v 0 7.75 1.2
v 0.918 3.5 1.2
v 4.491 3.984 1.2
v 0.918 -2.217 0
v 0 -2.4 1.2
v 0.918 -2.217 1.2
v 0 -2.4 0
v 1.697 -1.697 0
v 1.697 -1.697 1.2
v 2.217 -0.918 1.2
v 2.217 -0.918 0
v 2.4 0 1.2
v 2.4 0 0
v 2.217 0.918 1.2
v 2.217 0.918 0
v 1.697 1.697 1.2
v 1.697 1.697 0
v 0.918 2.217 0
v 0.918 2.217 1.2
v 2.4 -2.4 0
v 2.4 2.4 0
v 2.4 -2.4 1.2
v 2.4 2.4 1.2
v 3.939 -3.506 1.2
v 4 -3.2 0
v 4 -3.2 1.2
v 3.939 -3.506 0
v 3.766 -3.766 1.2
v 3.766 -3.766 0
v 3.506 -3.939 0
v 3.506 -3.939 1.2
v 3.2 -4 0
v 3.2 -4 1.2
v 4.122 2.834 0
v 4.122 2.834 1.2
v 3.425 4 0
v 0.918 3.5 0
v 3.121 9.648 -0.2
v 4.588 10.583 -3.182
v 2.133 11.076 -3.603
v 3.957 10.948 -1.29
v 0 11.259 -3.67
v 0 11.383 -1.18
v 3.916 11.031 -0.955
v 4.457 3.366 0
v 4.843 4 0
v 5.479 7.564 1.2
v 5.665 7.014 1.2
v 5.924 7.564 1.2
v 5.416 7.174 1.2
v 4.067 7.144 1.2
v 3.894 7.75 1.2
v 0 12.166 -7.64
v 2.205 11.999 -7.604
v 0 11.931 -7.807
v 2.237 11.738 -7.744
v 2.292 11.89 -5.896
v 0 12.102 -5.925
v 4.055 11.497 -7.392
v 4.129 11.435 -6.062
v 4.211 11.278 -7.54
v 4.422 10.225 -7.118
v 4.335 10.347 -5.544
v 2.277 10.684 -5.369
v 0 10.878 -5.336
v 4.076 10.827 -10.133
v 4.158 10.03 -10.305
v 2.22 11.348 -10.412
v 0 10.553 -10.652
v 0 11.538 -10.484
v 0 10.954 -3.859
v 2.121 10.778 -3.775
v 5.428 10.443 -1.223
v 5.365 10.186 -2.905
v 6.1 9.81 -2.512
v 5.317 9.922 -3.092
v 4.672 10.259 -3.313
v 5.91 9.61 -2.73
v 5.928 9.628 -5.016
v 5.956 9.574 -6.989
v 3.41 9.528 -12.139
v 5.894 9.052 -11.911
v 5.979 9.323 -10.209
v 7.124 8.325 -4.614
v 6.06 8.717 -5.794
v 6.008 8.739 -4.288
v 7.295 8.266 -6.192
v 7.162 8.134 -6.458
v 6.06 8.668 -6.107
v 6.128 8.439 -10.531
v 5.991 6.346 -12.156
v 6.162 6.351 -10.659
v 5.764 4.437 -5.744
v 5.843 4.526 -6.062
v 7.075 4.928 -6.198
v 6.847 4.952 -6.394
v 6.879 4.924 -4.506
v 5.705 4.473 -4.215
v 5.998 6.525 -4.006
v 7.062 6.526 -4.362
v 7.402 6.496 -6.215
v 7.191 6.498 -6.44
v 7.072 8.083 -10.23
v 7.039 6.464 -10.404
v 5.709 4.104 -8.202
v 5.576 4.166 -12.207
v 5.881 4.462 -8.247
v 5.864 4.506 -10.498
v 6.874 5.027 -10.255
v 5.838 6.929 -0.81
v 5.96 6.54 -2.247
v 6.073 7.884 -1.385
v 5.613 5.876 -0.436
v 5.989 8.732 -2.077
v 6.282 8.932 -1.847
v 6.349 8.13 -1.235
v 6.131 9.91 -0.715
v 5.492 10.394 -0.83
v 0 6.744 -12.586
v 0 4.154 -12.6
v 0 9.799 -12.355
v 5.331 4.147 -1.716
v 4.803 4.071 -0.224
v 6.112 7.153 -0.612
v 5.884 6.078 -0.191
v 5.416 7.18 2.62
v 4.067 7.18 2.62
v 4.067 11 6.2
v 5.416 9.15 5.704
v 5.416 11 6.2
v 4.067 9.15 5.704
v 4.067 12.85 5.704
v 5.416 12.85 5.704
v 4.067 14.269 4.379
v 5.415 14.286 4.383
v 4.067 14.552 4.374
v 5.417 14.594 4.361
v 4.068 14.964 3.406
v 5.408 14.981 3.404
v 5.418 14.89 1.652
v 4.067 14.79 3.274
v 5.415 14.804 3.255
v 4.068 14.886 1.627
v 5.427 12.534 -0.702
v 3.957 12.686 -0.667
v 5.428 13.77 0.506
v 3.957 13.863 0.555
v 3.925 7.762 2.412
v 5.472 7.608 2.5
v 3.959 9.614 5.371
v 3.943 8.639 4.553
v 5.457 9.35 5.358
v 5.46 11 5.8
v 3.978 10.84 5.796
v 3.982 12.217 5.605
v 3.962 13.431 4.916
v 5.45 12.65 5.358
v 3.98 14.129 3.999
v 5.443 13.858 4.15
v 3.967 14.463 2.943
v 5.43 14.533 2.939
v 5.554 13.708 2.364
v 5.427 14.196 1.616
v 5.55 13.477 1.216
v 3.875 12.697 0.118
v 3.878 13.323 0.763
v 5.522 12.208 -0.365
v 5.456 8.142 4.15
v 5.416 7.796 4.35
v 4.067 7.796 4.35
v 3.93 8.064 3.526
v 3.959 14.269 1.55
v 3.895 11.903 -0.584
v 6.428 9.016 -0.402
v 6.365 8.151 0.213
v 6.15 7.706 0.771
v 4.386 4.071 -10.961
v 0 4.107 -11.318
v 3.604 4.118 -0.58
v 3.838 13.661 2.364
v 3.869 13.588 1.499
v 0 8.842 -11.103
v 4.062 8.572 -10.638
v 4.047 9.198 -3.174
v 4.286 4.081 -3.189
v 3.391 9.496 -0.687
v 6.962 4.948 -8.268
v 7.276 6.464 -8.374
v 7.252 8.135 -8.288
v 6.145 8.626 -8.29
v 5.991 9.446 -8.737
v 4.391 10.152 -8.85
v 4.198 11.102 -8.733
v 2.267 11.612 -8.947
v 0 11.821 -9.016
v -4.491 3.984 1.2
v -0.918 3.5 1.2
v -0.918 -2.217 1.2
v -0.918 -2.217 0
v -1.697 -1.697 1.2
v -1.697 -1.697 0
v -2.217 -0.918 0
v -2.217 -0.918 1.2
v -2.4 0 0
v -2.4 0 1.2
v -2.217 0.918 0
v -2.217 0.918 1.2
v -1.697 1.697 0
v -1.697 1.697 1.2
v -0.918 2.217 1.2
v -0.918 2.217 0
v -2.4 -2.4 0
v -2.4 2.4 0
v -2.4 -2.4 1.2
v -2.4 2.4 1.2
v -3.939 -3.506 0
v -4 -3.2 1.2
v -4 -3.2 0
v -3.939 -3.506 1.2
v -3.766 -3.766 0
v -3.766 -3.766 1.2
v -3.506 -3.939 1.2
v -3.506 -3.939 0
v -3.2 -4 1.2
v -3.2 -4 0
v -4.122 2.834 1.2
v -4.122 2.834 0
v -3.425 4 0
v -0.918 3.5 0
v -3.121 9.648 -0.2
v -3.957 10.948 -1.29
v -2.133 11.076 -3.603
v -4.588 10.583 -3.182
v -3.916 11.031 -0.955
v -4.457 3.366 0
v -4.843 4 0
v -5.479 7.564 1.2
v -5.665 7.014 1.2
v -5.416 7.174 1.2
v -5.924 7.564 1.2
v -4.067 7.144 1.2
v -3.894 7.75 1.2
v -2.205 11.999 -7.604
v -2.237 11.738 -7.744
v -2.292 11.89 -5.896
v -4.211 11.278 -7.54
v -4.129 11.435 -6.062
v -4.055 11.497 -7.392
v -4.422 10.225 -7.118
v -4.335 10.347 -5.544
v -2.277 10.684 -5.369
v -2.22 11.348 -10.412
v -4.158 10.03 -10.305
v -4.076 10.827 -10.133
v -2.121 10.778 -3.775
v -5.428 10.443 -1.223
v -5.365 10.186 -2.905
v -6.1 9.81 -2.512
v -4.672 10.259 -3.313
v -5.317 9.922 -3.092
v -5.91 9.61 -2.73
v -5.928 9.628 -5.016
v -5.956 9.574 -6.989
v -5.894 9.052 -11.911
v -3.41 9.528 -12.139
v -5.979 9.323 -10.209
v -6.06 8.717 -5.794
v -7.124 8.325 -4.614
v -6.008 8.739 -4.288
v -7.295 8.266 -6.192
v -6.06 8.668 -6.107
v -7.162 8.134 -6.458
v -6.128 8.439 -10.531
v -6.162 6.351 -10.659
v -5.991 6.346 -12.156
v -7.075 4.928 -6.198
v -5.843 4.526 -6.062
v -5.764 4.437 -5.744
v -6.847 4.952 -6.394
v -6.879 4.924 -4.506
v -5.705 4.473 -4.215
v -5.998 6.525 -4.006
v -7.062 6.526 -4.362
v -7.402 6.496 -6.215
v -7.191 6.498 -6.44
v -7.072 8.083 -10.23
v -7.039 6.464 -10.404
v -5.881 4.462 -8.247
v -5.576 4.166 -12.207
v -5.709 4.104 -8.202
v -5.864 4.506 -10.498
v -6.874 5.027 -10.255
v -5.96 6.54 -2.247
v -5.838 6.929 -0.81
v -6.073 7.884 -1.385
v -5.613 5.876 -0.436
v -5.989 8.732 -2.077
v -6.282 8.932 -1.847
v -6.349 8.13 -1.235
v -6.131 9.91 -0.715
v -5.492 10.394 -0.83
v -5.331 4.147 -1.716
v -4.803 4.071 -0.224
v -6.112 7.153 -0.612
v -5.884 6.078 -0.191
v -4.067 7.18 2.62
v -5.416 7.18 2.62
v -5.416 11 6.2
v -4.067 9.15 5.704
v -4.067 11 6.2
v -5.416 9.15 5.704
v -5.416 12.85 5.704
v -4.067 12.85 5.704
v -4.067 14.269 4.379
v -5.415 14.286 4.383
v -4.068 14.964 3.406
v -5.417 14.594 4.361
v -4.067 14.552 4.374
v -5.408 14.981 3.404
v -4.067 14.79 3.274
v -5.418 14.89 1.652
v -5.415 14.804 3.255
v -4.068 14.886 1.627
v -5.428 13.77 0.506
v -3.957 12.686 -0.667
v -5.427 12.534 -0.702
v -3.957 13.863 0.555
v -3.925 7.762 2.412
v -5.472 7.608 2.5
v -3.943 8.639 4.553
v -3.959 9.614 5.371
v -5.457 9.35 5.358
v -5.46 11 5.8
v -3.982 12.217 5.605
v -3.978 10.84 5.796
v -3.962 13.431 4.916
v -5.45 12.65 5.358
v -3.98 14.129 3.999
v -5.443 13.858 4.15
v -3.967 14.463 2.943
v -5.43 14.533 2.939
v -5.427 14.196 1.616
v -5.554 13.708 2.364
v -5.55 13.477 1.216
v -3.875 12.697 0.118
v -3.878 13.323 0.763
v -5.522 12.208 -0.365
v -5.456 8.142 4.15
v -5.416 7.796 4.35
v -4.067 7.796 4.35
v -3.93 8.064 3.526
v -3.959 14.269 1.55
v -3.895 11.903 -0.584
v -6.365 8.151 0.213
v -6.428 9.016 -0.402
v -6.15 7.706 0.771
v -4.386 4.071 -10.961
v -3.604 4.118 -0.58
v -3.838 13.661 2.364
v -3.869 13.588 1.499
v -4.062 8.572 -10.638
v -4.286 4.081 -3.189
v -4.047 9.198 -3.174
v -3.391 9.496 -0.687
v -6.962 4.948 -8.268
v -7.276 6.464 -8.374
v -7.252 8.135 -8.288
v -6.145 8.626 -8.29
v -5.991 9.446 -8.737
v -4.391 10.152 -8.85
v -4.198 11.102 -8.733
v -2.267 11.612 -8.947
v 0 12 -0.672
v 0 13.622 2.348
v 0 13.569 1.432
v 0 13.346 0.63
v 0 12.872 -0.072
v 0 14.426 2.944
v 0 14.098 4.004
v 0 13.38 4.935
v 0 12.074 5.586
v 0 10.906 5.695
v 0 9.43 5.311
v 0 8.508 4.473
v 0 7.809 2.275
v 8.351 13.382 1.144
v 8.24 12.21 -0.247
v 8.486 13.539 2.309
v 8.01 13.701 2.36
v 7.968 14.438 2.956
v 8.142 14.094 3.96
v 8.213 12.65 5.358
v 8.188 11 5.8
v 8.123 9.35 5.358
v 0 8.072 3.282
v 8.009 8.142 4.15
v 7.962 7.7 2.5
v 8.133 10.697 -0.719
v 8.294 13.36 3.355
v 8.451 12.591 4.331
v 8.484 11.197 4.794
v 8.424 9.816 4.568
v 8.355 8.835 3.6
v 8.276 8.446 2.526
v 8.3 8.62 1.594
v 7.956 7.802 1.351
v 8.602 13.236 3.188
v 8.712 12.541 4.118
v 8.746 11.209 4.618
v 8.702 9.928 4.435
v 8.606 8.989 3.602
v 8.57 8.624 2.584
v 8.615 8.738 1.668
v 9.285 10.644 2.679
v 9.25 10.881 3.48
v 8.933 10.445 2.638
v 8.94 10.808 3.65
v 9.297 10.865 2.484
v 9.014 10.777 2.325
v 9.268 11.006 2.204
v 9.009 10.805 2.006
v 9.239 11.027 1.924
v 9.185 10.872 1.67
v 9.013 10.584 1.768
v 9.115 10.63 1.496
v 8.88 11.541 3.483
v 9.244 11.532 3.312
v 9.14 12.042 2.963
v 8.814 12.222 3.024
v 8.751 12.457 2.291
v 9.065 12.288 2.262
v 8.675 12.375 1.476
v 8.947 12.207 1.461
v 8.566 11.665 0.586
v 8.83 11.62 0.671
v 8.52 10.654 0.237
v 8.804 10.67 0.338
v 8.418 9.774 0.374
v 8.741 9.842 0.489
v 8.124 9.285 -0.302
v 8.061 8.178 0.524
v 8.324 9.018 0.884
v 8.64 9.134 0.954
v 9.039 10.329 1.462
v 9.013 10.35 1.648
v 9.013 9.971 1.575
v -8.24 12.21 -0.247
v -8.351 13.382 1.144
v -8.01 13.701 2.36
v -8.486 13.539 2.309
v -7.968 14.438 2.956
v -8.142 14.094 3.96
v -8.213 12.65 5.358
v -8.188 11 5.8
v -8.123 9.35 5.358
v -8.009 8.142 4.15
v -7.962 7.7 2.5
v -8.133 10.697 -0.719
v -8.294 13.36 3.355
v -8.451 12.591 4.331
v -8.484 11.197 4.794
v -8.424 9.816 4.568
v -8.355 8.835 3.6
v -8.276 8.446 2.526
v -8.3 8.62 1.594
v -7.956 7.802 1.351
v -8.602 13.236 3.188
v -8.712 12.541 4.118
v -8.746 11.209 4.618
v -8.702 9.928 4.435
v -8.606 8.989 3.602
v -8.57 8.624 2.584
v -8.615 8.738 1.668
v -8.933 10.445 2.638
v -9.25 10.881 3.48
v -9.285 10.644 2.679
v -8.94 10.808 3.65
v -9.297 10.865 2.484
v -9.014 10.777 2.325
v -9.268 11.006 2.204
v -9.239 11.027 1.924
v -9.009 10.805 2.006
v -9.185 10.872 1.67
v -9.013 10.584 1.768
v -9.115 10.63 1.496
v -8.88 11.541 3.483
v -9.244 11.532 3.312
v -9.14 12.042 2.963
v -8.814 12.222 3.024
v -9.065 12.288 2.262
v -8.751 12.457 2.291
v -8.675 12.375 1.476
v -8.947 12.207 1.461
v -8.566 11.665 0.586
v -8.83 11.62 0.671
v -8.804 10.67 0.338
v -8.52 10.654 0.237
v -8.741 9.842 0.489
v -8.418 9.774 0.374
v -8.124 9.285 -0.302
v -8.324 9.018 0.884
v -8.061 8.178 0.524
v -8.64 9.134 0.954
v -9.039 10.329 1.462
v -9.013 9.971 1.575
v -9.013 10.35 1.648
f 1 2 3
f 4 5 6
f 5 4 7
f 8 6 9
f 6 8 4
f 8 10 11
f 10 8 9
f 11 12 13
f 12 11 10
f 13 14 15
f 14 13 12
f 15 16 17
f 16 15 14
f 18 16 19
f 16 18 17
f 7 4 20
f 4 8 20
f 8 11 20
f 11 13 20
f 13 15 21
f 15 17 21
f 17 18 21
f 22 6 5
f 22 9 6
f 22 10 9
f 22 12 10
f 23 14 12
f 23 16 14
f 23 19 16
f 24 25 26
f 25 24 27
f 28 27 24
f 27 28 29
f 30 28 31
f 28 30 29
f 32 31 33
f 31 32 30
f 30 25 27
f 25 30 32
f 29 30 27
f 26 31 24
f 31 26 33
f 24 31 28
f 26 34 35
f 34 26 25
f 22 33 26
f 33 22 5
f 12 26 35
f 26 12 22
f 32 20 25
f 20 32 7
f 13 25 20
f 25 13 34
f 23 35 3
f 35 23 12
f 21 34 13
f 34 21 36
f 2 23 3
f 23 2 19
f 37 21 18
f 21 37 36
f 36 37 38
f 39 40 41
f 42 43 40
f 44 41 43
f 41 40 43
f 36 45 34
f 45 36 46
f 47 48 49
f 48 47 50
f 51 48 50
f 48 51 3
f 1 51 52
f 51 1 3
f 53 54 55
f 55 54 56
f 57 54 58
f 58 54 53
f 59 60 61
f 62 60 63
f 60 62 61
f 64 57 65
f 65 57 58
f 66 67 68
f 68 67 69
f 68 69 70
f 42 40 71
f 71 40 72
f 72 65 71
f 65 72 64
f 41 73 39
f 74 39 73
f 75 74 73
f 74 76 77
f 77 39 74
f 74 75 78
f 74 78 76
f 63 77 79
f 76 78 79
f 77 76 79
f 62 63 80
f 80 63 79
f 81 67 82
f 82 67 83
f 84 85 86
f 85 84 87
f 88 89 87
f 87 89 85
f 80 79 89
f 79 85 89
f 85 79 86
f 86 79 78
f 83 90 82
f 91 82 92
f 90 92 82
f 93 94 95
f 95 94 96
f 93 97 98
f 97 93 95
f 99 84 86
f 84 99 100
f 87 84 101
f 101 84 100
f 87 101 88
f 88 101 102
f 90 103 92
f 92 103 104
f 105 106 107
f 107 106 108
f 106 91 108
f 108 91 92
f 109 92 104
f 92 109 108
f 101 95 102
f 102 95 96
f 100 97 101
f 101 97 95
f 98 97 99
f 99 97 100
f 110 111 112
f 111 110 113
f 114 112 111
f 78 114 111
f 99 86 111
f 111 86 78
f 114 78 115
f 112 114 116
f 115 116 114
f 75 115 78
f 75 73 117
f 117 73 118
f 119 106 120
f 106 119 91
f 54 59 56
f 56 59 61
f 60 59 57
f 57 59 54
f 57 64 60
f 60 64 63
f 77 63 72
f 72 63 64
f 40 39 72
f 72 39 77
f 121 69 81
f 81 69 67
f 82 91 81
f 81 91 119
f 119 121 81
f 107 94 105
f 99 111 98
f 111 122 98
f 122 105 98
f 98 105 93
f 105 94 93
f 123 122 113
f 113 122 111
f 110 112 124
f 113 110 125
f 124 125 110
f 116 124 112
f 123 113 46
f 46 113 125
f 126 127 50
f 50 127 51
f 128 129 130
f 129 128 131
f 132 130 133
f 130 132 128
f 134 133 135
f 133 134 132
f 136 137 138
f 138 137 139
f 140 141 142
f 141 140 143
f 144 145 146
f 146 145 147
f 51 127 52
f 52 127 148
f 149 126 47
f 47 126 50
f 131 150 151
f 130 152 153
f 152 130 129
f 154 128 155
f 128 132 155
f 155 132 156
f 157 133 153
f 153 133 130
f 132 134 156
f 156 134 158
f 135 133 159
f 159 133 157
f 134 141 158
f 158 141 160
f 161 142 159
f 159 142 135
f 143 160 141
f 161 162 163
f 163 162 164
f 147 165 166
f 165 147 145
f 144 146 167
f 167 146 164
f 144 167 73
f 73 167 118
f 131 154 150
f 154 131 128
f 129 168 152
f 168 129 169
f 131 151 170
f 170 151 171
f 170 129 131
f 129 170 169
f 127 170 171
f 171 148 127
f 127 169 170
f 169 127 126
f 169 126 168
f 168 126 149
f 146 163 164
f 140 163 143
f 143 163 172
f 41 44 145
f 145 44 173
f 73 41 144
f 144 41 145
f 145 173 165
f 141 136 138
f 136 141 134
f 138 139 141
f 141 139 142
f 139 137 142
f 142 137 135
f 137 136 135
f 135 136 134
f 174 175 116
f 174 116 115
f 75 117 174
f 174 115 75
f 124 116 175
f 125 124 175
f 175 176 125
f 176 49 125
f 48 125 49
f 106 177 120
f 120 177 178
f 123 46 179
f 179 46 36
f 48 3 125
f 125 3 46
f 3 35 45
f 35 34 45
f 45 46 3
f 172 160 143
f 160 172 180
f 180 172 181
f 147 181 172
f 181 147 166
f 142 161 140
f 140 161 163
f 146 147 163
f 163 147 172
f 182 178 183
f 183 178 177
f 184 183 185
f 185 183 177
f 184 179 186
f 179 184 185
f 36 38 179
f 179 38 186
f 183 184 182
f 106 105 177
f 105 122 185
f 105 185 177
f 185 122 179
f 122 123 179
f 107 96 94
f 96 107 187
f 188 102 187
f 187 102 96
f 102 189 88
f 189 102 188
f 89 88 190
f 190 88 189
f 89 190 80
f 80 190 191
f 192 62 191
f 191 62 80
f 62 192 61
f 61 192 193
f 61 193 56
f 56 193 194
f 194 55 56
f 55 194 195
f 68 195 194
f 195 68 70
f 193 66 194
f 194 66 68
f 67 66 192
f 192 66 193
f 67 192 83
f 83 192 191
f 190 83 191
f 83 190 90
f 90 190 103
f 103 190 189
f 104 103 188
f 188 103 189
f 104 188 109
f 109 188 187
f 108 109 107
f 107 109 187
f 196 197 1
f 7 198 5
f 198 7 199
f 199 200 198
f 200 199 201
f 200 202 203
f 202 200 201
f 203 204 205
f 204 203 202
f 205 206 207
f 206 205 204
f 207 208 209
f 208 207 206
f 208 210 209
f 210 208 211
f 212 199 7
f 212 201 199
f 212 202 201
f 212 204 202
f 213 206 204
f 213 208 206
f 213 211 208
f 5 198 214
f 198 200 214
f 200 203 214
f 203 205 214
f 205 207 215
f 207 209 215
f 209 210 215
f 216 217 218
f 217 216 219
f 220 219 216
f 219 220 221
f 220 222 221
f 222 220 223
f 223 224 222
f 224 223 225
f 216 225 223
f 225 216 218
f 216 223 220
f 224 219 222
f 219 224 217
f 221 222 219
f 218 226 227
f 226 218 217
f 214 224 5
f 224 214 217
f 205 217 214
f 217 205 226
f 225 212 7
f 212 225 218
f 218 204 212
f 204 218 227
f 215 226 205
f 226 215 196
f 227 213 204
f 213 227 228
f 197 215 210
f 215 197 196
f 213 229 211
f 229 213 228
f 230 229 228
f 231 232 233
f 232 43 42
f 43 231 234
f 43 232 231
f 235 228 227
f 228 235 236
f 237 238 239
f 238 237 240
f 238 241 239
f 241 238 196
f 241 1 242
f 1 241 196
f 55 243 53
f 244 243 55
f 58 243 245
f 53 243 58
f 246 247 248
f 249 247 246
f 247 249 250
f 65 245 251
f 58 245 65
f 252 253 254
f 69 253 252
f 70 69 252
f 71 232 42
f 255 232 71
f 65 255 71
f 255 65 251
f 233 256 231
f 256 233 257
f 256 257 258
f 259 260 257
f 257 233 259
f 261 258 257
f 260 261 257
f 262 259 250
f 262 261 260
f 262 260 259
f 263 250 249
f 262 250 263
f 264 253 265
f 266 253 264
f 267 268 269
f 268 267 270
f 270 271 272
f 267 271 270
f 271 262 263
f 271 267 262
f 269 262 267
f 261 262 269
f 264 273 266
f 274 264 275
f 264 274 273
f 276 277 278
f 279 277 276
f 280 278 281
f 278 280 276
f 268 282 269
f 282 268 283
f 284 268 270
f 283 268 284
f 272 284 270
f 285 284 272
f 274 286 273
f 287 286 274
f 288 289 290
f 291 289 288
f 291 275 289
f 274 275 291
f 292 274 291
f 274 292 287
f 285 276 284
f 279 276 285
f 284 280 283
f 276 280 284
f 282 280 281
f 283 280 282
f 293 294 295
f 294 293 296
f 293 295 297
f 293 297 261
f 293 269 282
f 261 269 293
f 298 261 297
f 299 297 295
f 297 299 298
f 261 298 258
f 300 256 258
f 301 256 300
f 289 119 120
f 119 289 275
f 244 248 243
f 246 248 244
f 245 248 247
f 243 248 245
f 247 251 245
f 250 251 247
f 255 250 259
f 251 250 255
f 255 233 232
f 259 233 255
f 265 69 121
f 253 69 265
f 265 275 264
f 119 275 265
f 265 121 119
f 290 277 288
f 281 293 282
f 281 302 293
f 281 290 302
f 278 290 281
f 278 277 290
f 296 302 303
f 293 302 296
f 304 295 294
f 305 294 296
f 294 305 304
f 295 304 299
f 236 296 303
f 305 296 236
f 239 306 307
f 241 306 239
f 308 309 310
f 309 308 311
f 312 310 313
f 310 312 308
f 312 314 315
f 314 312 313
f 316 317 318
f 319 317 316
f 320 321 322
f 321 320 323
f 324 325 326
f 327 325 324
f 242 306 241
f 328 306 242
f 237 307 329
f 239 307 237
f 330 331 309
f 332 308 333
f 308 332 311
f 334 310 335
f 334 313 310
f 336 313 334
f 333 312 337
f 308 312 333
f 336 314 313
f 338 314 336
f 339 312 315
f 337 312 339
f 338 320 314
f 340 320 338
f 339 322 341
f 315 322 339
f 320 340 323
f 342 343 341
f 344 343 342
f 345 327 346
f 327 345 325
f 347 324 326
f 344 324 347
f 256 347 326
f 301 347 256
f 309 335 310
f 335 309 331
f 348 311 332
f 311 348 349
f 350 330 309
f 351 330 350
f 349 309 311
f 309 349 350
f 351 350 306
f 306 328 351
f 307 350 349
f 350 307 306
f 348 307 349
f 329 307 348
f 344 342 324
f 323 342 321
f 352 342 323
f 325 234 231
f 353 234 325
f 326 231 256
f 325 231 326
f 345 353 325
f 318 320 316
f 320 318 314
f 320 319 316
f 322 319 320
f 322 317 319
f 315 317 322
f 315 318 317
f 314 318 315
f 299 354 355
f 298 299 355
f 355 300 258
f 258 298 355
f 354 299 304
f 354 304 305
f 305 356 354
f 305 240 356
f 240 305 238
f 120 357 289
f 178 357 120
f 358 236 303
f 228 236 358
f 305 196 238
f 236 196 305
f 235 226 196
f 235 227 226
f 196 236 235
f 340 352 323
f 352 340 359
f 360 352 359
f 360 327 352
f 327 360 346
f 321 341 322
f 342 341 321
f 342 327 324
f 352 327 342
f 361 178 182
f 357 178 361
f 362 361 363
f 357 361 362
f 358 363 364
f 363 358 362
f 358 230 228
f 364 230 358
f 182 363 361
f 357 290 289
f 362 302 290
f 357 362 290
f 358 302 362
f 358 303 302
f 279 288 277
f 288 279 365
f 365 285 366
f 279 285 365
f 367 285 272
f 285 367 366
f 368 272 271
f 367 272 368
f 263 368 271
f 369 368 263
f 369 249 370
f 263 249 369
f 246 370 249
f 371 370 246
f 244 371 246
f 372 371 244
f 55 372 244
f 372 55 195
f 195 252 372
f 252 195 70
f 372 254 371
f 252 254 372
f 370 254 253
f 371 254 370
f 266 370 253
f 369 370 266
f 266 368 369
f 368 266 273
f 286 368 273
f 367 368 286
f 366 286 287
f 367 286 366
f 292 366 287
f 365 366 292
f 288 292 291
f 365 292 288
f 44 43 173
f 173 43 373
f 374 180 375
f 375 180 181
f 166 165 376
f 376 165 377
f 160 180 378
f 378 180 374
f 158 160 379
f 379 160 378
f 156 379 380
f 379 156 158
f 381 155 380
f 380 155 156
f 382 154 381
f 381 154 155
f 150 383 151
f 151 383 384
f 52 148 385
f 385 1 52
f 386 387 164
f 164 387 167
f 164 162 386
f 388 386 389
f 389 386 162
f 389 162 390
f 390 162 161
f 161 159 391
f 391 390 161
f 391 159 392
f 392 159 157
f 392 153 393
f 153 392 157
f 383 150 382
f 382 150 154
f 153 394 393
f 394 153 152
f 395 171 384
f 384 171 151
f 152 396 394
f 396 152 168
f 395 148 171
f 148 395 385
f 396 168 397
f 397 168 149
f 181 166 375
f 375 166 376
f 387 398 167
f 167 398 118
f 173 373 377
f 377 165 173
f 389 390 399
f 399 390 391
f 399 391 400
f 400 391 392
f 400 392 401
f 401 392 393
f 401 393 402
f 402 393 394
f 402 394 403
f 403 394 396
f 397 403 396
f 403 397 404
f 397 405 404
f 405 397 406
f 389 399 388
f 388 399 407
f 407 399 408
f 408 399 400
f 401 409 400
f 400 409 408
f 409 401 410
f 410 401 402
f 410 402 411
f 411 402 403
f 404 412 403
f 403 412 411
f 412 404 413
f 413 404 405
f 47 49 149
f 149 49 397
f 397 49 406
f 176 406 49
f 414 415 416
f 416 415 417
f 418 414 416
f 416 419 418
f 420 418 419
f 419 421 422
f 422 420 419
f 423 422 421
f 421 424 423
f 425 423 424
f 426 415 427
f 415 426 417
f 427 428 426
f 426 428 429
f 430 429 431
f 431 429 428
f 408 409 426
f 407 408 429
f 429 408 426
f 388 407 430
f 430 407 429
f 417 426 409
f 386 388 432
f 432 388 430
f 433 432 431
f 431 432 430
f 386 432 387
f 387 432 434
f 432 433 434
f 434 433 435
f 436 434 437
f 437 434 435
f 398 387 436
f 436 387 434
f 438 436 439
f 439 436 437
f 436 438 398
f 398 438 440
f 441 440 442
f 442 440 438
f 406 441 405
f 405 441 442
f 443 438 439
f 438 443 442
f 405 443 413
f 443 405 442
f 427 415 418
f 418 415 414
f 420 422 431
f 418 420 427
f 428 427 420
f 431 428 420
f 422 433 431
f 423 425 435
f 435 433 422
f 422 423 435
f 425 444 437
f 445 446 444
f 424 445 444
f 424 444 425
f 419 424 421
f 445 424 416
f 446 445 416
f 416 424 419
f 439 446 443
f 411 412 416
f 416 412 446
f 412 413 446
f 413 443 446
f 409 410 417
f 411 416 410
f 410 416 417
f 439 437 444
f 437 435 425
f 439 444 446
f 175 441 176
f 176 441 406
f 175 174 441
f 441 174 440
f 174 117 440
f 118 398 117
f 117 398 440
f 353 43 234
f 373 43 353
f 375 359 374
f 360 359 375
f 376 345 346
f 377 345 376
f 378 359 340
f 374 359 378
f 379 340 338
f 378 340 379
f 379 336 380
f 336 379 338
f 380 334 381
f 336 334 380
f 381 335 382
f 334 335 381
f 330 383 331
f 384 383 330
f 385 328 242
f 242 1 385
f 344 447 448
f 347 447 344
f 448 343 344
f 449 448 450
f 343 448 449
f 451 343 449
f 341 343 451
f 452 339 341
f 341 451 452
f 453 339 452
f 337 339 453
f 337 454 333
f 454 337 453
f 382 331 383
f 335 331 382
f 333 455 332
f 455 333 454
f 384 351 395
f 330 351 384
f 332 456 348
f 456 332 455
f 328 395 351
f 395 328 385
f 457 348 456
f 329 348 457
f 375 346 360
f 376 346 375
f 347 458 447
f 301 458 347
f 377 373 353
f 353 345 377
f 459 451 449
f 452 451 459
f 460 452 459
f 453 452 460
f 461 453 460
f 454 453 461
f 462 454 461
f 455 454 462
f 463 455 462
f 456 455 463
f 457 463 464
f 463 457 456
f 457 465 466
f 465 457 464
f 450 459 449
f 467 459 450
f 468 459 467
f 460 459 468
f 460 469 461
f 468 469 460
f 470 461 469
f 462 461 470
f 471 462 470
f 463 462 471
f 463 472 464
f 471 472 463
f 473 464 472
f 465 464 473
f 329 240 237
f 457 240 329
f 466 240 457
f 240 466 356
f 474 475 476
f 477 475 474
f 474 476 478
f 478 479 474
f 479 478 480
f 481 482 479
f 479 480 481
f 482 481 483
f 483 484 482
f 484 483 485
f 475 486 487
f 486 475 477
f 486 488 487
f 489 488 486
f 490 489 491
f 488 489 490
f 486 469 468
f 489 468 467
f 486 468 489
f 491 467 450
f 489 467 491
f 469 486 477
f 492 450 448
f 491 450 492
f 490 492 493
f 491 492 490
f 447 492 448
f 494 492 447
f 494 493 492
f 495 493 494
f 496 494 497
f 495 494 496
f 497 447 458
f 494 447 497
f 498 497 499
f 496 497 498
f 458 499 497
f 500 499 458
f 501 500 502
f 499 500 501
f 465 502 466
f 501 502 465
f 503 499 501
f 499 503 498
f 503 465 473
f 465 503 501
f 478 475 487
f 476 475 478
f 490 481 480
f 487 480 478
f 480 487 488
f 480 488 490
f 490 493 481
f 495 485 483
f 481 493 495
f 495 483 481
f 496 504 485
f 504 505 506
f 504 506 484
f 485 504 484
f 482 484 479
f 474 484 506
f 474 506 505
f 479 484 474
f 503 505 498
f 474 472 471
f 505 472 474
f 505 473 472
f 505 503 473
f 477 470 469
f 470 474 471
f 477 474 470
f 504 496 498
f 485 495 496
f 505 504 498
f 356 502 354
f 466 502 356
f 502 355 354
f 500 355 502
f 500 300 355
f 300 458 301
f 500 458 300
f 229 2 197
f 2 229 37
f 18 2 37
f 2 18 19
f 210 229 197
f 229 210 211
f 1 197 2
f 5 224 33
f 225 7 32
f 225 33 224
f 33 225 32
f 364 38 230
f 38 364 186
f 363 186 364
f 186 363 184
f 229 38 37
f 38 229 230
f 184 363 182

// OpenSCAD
use <../lib.scad>
use <../p/box3u2p.scad>
use <../p/rect2p.scad>
use <s/26073s01.scad>
use <s/26073s02.scad>
$fa=1; $fs=0.2;
function ldraw_lib__26073(realsolid=false) = [
// 0 Minifig Backpack with Three Pouches and Bedroll
// 0 Name: 26073.dat
// 0 Author: Gerald Lasser [GeraldLasser]
// 0 !LDRAW_ORG Part UPDATE 2022-04
// 0 !LICENSE Licensed under CC BY 2.0 and CC BY 4.0 : see CAreadme.txt
// 
// 0 BFC CERTIFY CCW
  [0,"BFC","CERTIFY"],
  [0,"BFC","CCW"],
// 
// 0 !CATEGORY Minifig Neckwear
// 
// 0 !HISTORY 2022-07-18 [PTadmin] Official Update 2022-04
// 
// 
// 1 16 0 0 0 1 0 0 0 1 0 0 0 1 s\26073s01.dat
  [1,16,0,0,0,1,0,0,0,1,0,0,0,1, ldraw_lib__s__26073s01(realsolid)],
// 1 16 0 0 0 -1 0 0 0 1 0 0 0 1 s\26073s01.dat
  [1,16,0,0,0,-1,0,0,0,1,0,0,0,1, ldraw_lib__s__26073s01(realsolid)],
// 1 16 0 0 0 1 0 0 0 1 0 0 0 1 s\26073s02.dat
  [1,16,0,0,0,1,0,0,0,1,0,0,0,1, ldraw_lib__s__26073s02(realsolid)],
// 1 16 0 0 0 -1 0 0 0 1 0 0 0 1 s\26073s02.dat
  [1,16,0,0,0,-1,0,0,0,1,0,0,0,1, ldraw_lib__s__26073s02(realsolid)],
// 
// 0 BFC INVERTNEXT
  [0,"BFC","INVERTNEXT"],
// 1 16 0 -1.5 5.5434 0 0 2.2962 1.5 0 0 0 3.2066 0 box3u2p.dat
  [1,16,0,-1.5,5.5434,0,0,2.2962,1.5,0,0,0,3.2066,0, ldraw_lib__box3u2p(realsolid)],
// 3 16 0 -3 19.374 -2.2962 -3 8.75 2.2962 -3 8.75
  [3,16,0,-3,19.374,-2.2962,-3,8.75,2.2962,-3,8.75],
// 3 16 0 -3 -6 -8 -3 -10 8 -3 -10
  [3,16,0,-3,-6,-8,-3,-10,8,-3,-10],
// 3 16 -8 0 -10 0 0 -6 8 0 -10
  [3,16,-8,0,-10,0,0,-6,8,0,-10],
// 1 16 0 -1.5 -10 -8 0 0 0 0 1.5 0 1 0 rect2p.dat
  [1,16,0,-1.5,-10,-8,0,0,0,0,1.5,0,1,0, ldraw_lib__rect2p(realsolid)],
// 2 24 7.802 .499 24.119 -7.802 .499 24.119
  [2,24,7.802,.499,24.119,-7.802,.499,24.119],
// 
// 4 16 7.802 .499 24.119 -7.802 .499 24.119 -8.477 1.717 23.739 8.477 1.717 23.739
  [4,16,7.802,.499,24.119,-7.802,.499,24.119,-8.477,1.717,23.739,8.477,1.717,23.739],
// 4 16 10.117 7.934 22.995 8.477 1.717 23.739 -8.477 1.717 23.739 -10.117 7.934 22.995
  [4,16,10.117,7.934,22.995,8.477,1.717,23.739,-8.477,1.717,23.739,-10.117,7.934,22.995],
// 4 16 2.2962 0 8.75 -2.2962 0 8.75 -7.802 .499 24.119 7.802 .499 24.119
  [4,16,2.2962,0,8.75,-2.2962,0,8.75,-7.802,.499,24.119,7.802,.499,24.119],
// 3 16 10.117 7.934 22.995 -10.117 7.934 22.995 0 27.758 22.106
  [3,16,10.117,7.934,22.995,-10.117,7.934,22.995,0,27.758,22.106],
// 5 24 8.477 1.717 23.739 -8.477 1.717 23.739 7.802 .499 24.119 10.117 7.934 22.995
  [5,24,8.477,1.717,23.739,-8.477,1.717,23.739,7.802,.499,24.119,10.117,7.934,22.995],
// 5 24 -10.117 7.934 22.995 10.117 7.934 22.995 8.477 1.717 23.739 10.156 26.595 21.431
  [5,24,-10.117,7.934,22.995,10.117,7.934,22.995,8.477,1.717,23.739,10.156,26.595,21.431],
// 5 24 10.117 7.934 22.995 0 27.758 22.106 10.156 26.595 21.431 -10.117 7.934 22.995
  [5,24,10.117,7.934,22.995,0,27.758,22.106,10.156,26.595,21.431,-10.117,7.934,22.995],
// 5 24 0 27.758 22.106 -10.117 7.934 22.995 10.117 7.934 22.995 -10.156 26.595 21.431
  [5,24,0,27.758,22.106,-10.117,7.934,22.995,10.117,7.934,22.995,-10.156,26.595,21.431],
// 
// 0 // Seam
// 5 24 0 31.466 16.86 0 31.501 10.384 -14.977 30.389 15.864 13.94 30.517 10.414
  [5,24,0,31.466,16.86,0,31.501,10.384,-14.977,30.389,15.864,13.94,30.517,10.414],
// 5 24 0 30.888 24.497 0 31.466 16.86 8.525 30.348 23.819 -8.525 30.348 23.819
  [5,24,0,30.888,24.497,0,31.466,16.86,8.525,30.348,23.819,-8.525,30.348,23.819],
// 5 24 0 26.629 26.383 0 30.888 24.497 8.525 30.348 23.819 -8.525 30.348 23.819
  [5,24,0,26.629,26.383,0,30.888,24.497,8.525,30.348,23.819,-8.525,30.348,23.819],
// 5 24 0 26.629 26.383 0 26.211 28.844 5.549 26.03 28.371 -5.549 26.03 28.371
  [5,24,0,26.629,26.383,0,26.211,28.844,5.549,26.03,28.371,-5.549,26.03,28.371],
// 5 24 0 22.541 29.553 0 26.211 28.844 -5.667 22.367 29.03 5.549 26.03 28.371
  [5,24,0,22.541,29.553,0,26.211,28.844,-5.667,22.367,29.03,5.549,26.03,28.371],
// 5 24 0 22.541 29.553 0 19.518 29.827 -5.667 22.367 29.03 5.592 19.361 29.344
  [5,24,0,22.541,29.553,0,19.518,29.827,-5.667,22.367,29.03,5.592,19.361,29.344],
// 5 24 0 19.518 29.827 0 19.101 30.416 -5.512 19.01 29.997 5.512 19.01 29.997
  [5,24,0,19.518,29.827,0,19.101,30.416,-5.512,19.01,29.997,5.512,19.01,29.997],
// 5 24 0 14.812 30.254 0 19.101 30.416 5.512 19.01 29.997 -5.512 19.01 29.997
  [5,24,0,14.812,30.254,0,19.101,30.416,5.512,19.01,29.997,-5.512,19.01,29.997],
// 5 24 0 13.34 27.194 0 14.812 30.254 5.731 14.739 29.726 -5.731 14.739 29.726
  [5,24,0,13.34,27.194,0,14.812,30.254,5.731,14.739,29.726,-5.731,14.739,29.726],
// 5 24 0 13.34 27.194 0 9.647 27.386 5.303 9.437 26.946 -5.693 13.422 26.709
  [5,24,0,13.34,27.194,0,9.647,27.386,5.303,9.437,26.946,-5.693,13.422,26.709],
// 5 24 0 9.647 27.386 0 9.174 28.147 5.332 9.008 27.69 -5.332 9.008 27.69
  [5,24,0,9.647,27.386,0,9.174,28.147,5.332,9.008,27.69,-5.332,9.008,27.69],
// 5 24 0 9.174 28.147 0 2.95 28.458 -5.332 9.008 27.69 5.332 9.008 27.69
  [5,24,0,9.174,28.147,0,2.95,28.458,-5.332,9.008,27.69,5.332,9.008,27.69],
// 5 24 0 1.68 29.999 0 2.95 28.458 -9.738 1.231 29.578 9.738 1.231 29.578
  [5,24,0,1.68,29.999,0,2.95,28.458,-9.738,1.231,29.578,9.738,1.231,29.578],
// 5 24 0 .179 32.18 0 1.68 29.999 9.687 -.296 31.742 -9.738 1.231 29.578
  [5,24,0,.179,32.18,0,1.68,29.999,9.687,-.296,31.742,-9.738,1.231,29.578],
// 5 24 0 -1.576 33.365 0 .179 32.18 9.687 -.296 31.742 -9.687 -.296 31.742
  [5,24,0,-1.576,33.365,0,.179,32.18,9.687,-.296,31.742,-9.687,-.296,31.742],
// 5 24 0 -3.579 33.922 0 -1.576 33.365 9.696 -1.907 33.307 -9.696 -1.907 33.307
  [5,24,0,-3.579,33.922,0,-1.576,33.365,9.696,-1.907,33.307,-9.696,-1.907,33.307],
// 5 24 0 -3.579 33.922 0 -5.871 34.055 9.594 -5.911 34.153 -9.594 -5.911 34.153
  [5,24,0,-3.579,33.922,0,-5.871,34.055,9.594,-5.911,34.153,-9.594,-5.911,34.153],
// 5 24 0 -5.871 34.055 0 -7.36 36.065 9.594 -5.911 34.153 -9.594 -5.911 34.153
  [5,24,0,-5.871,34.055,0,-7.36,36.065,9.594,-5.911,34.153,-9.594,-5.911,34.153],
// 5 24 0 -10.009 35.245 0 -7.36 36.065 9.918 -7.358 36.157 -9.918 -7.358 36.157
  [5,24,0,-10.009,35.245,0,-7.36,36.065,9.918,-7.358,36.157,-9.918,-7.358,36.157],
// 5 24 0 -12.337 33.451 0 -10.009 35.245 9.904 -12.291 33.578 -9.95 -9.997 35.323
  [5,24,0,-12.337,33.451,0,-10.009,35.245,9.904,-12.291,33.578,-9.95,-9.997,35.323],
// 5 24 0 -13.966 30.184 0 -12.337 33.451 9.956 -14.012 30.543 -9.956 -14.012 30.543
  [5,24,0,-13.966,30.184,0,-12.337,33.451,9.956,-14.012,30.543,-9.956,-14.012,30.543],
// 5 24 0 -14.238 27.264 0 -13.966 30.184 -9.946 -14.489 27.1 9.946 -14.489 27.1
  [5,24,0,-14.238,27.264,0,-13.966,30.184,-9.946,-14.489,27.1,9.946,-14.489,27.1],
// 5 24 0 -5.688 19.523 0 -3 19.374 -9.812 -6.029 19.404 9.735 -3 19.374
  [5,24,0,-5.688,19.523,0,-3,19.374,-9.812,-6.029,19.404,9.735,-3,19.374],
// 5 24 0 -5.688 19.523 0 -8.205 20.18 -9.825 -8.814 20.16 9.812 -6.029 19.404
  [5,24,0,-5.688,19.523,0,-8.205,20.18,-9.825,-8.814,20.16,9.812,-6.029,19.404],
// 5 24 0 -8.205 20.18 0 -11.183 21.269 -9.825 -8.814 20.16 9.825 -8.814 20.16
  [5,24,0,-8.205,20.18,0,-11.183,21.269,-9.825,-8.814,20.16,9.825,-8.814,20.16],
// 5 24 0 -11.183 21.269 0 -13.278 23.574 -9.857 -11.382 21.598 9.857 -11.382 21.598
  [5,24,0,-11.183,21.269,0,-13.278,23.574,-9.857,-11.382,21.598,9.857,-11.382,21.598],
// 5 24 0 -13.278 23.574 0 -14.238 27.264 9.897 -13.428 24.034 -9.897 -13.428 24.034
  [5,24,0,-13.278,23.574,0,-14.238,27.264,9.897,-13.428,24.034,-9.897,-13.428,24.034],
// 5 24 0 28.295 10.267 0 31.501 10.384 10.966 27.403 10.178 -10.966 27.403 10.178
  [5,24,0,28.295,10.267,0,31.501,10.384,10.966,27.403,10.178,-10.966,27.403,10.178],
// 5 24 0 27.758 22.106 0 28.295 10.267 -10.156 26.595 21.431 10.156 26.595 21.431
  [5,24,0,27.758,22.106,0,28.295,10.267,-10.156,26.595,21.431,10.156,26.595,21.431],
// 
// 5 24 -7.802 .499 24.119 -2.2962 0 8.75 -8.563 0 10 7.802 .499 24.119
  [5,24,-7.802,.499,24.119,-2.2962,0,8.75,-8.563,0,10,7.802,.499,24.119],
// 5 24 7.802 .499 24.119 2.2962 0 8.75 -7.802 .499 24.119 8.563 0 10
  [5,24,7.802,.499,24.119,2.2962,0,8.75,-7.802,.499,24.119,8.563,0,10],
];
module ldraw_lib__26073(step=0, col=false, unit=2/5, alt=false, line=0.2, solid=!$preview)
    makepoly(ldraw_lib__26073(solid), step=step, col=col, unit=unit, alt=alt, line=line, solid=solid);
ldraw_lib__26073(line=0.2);
